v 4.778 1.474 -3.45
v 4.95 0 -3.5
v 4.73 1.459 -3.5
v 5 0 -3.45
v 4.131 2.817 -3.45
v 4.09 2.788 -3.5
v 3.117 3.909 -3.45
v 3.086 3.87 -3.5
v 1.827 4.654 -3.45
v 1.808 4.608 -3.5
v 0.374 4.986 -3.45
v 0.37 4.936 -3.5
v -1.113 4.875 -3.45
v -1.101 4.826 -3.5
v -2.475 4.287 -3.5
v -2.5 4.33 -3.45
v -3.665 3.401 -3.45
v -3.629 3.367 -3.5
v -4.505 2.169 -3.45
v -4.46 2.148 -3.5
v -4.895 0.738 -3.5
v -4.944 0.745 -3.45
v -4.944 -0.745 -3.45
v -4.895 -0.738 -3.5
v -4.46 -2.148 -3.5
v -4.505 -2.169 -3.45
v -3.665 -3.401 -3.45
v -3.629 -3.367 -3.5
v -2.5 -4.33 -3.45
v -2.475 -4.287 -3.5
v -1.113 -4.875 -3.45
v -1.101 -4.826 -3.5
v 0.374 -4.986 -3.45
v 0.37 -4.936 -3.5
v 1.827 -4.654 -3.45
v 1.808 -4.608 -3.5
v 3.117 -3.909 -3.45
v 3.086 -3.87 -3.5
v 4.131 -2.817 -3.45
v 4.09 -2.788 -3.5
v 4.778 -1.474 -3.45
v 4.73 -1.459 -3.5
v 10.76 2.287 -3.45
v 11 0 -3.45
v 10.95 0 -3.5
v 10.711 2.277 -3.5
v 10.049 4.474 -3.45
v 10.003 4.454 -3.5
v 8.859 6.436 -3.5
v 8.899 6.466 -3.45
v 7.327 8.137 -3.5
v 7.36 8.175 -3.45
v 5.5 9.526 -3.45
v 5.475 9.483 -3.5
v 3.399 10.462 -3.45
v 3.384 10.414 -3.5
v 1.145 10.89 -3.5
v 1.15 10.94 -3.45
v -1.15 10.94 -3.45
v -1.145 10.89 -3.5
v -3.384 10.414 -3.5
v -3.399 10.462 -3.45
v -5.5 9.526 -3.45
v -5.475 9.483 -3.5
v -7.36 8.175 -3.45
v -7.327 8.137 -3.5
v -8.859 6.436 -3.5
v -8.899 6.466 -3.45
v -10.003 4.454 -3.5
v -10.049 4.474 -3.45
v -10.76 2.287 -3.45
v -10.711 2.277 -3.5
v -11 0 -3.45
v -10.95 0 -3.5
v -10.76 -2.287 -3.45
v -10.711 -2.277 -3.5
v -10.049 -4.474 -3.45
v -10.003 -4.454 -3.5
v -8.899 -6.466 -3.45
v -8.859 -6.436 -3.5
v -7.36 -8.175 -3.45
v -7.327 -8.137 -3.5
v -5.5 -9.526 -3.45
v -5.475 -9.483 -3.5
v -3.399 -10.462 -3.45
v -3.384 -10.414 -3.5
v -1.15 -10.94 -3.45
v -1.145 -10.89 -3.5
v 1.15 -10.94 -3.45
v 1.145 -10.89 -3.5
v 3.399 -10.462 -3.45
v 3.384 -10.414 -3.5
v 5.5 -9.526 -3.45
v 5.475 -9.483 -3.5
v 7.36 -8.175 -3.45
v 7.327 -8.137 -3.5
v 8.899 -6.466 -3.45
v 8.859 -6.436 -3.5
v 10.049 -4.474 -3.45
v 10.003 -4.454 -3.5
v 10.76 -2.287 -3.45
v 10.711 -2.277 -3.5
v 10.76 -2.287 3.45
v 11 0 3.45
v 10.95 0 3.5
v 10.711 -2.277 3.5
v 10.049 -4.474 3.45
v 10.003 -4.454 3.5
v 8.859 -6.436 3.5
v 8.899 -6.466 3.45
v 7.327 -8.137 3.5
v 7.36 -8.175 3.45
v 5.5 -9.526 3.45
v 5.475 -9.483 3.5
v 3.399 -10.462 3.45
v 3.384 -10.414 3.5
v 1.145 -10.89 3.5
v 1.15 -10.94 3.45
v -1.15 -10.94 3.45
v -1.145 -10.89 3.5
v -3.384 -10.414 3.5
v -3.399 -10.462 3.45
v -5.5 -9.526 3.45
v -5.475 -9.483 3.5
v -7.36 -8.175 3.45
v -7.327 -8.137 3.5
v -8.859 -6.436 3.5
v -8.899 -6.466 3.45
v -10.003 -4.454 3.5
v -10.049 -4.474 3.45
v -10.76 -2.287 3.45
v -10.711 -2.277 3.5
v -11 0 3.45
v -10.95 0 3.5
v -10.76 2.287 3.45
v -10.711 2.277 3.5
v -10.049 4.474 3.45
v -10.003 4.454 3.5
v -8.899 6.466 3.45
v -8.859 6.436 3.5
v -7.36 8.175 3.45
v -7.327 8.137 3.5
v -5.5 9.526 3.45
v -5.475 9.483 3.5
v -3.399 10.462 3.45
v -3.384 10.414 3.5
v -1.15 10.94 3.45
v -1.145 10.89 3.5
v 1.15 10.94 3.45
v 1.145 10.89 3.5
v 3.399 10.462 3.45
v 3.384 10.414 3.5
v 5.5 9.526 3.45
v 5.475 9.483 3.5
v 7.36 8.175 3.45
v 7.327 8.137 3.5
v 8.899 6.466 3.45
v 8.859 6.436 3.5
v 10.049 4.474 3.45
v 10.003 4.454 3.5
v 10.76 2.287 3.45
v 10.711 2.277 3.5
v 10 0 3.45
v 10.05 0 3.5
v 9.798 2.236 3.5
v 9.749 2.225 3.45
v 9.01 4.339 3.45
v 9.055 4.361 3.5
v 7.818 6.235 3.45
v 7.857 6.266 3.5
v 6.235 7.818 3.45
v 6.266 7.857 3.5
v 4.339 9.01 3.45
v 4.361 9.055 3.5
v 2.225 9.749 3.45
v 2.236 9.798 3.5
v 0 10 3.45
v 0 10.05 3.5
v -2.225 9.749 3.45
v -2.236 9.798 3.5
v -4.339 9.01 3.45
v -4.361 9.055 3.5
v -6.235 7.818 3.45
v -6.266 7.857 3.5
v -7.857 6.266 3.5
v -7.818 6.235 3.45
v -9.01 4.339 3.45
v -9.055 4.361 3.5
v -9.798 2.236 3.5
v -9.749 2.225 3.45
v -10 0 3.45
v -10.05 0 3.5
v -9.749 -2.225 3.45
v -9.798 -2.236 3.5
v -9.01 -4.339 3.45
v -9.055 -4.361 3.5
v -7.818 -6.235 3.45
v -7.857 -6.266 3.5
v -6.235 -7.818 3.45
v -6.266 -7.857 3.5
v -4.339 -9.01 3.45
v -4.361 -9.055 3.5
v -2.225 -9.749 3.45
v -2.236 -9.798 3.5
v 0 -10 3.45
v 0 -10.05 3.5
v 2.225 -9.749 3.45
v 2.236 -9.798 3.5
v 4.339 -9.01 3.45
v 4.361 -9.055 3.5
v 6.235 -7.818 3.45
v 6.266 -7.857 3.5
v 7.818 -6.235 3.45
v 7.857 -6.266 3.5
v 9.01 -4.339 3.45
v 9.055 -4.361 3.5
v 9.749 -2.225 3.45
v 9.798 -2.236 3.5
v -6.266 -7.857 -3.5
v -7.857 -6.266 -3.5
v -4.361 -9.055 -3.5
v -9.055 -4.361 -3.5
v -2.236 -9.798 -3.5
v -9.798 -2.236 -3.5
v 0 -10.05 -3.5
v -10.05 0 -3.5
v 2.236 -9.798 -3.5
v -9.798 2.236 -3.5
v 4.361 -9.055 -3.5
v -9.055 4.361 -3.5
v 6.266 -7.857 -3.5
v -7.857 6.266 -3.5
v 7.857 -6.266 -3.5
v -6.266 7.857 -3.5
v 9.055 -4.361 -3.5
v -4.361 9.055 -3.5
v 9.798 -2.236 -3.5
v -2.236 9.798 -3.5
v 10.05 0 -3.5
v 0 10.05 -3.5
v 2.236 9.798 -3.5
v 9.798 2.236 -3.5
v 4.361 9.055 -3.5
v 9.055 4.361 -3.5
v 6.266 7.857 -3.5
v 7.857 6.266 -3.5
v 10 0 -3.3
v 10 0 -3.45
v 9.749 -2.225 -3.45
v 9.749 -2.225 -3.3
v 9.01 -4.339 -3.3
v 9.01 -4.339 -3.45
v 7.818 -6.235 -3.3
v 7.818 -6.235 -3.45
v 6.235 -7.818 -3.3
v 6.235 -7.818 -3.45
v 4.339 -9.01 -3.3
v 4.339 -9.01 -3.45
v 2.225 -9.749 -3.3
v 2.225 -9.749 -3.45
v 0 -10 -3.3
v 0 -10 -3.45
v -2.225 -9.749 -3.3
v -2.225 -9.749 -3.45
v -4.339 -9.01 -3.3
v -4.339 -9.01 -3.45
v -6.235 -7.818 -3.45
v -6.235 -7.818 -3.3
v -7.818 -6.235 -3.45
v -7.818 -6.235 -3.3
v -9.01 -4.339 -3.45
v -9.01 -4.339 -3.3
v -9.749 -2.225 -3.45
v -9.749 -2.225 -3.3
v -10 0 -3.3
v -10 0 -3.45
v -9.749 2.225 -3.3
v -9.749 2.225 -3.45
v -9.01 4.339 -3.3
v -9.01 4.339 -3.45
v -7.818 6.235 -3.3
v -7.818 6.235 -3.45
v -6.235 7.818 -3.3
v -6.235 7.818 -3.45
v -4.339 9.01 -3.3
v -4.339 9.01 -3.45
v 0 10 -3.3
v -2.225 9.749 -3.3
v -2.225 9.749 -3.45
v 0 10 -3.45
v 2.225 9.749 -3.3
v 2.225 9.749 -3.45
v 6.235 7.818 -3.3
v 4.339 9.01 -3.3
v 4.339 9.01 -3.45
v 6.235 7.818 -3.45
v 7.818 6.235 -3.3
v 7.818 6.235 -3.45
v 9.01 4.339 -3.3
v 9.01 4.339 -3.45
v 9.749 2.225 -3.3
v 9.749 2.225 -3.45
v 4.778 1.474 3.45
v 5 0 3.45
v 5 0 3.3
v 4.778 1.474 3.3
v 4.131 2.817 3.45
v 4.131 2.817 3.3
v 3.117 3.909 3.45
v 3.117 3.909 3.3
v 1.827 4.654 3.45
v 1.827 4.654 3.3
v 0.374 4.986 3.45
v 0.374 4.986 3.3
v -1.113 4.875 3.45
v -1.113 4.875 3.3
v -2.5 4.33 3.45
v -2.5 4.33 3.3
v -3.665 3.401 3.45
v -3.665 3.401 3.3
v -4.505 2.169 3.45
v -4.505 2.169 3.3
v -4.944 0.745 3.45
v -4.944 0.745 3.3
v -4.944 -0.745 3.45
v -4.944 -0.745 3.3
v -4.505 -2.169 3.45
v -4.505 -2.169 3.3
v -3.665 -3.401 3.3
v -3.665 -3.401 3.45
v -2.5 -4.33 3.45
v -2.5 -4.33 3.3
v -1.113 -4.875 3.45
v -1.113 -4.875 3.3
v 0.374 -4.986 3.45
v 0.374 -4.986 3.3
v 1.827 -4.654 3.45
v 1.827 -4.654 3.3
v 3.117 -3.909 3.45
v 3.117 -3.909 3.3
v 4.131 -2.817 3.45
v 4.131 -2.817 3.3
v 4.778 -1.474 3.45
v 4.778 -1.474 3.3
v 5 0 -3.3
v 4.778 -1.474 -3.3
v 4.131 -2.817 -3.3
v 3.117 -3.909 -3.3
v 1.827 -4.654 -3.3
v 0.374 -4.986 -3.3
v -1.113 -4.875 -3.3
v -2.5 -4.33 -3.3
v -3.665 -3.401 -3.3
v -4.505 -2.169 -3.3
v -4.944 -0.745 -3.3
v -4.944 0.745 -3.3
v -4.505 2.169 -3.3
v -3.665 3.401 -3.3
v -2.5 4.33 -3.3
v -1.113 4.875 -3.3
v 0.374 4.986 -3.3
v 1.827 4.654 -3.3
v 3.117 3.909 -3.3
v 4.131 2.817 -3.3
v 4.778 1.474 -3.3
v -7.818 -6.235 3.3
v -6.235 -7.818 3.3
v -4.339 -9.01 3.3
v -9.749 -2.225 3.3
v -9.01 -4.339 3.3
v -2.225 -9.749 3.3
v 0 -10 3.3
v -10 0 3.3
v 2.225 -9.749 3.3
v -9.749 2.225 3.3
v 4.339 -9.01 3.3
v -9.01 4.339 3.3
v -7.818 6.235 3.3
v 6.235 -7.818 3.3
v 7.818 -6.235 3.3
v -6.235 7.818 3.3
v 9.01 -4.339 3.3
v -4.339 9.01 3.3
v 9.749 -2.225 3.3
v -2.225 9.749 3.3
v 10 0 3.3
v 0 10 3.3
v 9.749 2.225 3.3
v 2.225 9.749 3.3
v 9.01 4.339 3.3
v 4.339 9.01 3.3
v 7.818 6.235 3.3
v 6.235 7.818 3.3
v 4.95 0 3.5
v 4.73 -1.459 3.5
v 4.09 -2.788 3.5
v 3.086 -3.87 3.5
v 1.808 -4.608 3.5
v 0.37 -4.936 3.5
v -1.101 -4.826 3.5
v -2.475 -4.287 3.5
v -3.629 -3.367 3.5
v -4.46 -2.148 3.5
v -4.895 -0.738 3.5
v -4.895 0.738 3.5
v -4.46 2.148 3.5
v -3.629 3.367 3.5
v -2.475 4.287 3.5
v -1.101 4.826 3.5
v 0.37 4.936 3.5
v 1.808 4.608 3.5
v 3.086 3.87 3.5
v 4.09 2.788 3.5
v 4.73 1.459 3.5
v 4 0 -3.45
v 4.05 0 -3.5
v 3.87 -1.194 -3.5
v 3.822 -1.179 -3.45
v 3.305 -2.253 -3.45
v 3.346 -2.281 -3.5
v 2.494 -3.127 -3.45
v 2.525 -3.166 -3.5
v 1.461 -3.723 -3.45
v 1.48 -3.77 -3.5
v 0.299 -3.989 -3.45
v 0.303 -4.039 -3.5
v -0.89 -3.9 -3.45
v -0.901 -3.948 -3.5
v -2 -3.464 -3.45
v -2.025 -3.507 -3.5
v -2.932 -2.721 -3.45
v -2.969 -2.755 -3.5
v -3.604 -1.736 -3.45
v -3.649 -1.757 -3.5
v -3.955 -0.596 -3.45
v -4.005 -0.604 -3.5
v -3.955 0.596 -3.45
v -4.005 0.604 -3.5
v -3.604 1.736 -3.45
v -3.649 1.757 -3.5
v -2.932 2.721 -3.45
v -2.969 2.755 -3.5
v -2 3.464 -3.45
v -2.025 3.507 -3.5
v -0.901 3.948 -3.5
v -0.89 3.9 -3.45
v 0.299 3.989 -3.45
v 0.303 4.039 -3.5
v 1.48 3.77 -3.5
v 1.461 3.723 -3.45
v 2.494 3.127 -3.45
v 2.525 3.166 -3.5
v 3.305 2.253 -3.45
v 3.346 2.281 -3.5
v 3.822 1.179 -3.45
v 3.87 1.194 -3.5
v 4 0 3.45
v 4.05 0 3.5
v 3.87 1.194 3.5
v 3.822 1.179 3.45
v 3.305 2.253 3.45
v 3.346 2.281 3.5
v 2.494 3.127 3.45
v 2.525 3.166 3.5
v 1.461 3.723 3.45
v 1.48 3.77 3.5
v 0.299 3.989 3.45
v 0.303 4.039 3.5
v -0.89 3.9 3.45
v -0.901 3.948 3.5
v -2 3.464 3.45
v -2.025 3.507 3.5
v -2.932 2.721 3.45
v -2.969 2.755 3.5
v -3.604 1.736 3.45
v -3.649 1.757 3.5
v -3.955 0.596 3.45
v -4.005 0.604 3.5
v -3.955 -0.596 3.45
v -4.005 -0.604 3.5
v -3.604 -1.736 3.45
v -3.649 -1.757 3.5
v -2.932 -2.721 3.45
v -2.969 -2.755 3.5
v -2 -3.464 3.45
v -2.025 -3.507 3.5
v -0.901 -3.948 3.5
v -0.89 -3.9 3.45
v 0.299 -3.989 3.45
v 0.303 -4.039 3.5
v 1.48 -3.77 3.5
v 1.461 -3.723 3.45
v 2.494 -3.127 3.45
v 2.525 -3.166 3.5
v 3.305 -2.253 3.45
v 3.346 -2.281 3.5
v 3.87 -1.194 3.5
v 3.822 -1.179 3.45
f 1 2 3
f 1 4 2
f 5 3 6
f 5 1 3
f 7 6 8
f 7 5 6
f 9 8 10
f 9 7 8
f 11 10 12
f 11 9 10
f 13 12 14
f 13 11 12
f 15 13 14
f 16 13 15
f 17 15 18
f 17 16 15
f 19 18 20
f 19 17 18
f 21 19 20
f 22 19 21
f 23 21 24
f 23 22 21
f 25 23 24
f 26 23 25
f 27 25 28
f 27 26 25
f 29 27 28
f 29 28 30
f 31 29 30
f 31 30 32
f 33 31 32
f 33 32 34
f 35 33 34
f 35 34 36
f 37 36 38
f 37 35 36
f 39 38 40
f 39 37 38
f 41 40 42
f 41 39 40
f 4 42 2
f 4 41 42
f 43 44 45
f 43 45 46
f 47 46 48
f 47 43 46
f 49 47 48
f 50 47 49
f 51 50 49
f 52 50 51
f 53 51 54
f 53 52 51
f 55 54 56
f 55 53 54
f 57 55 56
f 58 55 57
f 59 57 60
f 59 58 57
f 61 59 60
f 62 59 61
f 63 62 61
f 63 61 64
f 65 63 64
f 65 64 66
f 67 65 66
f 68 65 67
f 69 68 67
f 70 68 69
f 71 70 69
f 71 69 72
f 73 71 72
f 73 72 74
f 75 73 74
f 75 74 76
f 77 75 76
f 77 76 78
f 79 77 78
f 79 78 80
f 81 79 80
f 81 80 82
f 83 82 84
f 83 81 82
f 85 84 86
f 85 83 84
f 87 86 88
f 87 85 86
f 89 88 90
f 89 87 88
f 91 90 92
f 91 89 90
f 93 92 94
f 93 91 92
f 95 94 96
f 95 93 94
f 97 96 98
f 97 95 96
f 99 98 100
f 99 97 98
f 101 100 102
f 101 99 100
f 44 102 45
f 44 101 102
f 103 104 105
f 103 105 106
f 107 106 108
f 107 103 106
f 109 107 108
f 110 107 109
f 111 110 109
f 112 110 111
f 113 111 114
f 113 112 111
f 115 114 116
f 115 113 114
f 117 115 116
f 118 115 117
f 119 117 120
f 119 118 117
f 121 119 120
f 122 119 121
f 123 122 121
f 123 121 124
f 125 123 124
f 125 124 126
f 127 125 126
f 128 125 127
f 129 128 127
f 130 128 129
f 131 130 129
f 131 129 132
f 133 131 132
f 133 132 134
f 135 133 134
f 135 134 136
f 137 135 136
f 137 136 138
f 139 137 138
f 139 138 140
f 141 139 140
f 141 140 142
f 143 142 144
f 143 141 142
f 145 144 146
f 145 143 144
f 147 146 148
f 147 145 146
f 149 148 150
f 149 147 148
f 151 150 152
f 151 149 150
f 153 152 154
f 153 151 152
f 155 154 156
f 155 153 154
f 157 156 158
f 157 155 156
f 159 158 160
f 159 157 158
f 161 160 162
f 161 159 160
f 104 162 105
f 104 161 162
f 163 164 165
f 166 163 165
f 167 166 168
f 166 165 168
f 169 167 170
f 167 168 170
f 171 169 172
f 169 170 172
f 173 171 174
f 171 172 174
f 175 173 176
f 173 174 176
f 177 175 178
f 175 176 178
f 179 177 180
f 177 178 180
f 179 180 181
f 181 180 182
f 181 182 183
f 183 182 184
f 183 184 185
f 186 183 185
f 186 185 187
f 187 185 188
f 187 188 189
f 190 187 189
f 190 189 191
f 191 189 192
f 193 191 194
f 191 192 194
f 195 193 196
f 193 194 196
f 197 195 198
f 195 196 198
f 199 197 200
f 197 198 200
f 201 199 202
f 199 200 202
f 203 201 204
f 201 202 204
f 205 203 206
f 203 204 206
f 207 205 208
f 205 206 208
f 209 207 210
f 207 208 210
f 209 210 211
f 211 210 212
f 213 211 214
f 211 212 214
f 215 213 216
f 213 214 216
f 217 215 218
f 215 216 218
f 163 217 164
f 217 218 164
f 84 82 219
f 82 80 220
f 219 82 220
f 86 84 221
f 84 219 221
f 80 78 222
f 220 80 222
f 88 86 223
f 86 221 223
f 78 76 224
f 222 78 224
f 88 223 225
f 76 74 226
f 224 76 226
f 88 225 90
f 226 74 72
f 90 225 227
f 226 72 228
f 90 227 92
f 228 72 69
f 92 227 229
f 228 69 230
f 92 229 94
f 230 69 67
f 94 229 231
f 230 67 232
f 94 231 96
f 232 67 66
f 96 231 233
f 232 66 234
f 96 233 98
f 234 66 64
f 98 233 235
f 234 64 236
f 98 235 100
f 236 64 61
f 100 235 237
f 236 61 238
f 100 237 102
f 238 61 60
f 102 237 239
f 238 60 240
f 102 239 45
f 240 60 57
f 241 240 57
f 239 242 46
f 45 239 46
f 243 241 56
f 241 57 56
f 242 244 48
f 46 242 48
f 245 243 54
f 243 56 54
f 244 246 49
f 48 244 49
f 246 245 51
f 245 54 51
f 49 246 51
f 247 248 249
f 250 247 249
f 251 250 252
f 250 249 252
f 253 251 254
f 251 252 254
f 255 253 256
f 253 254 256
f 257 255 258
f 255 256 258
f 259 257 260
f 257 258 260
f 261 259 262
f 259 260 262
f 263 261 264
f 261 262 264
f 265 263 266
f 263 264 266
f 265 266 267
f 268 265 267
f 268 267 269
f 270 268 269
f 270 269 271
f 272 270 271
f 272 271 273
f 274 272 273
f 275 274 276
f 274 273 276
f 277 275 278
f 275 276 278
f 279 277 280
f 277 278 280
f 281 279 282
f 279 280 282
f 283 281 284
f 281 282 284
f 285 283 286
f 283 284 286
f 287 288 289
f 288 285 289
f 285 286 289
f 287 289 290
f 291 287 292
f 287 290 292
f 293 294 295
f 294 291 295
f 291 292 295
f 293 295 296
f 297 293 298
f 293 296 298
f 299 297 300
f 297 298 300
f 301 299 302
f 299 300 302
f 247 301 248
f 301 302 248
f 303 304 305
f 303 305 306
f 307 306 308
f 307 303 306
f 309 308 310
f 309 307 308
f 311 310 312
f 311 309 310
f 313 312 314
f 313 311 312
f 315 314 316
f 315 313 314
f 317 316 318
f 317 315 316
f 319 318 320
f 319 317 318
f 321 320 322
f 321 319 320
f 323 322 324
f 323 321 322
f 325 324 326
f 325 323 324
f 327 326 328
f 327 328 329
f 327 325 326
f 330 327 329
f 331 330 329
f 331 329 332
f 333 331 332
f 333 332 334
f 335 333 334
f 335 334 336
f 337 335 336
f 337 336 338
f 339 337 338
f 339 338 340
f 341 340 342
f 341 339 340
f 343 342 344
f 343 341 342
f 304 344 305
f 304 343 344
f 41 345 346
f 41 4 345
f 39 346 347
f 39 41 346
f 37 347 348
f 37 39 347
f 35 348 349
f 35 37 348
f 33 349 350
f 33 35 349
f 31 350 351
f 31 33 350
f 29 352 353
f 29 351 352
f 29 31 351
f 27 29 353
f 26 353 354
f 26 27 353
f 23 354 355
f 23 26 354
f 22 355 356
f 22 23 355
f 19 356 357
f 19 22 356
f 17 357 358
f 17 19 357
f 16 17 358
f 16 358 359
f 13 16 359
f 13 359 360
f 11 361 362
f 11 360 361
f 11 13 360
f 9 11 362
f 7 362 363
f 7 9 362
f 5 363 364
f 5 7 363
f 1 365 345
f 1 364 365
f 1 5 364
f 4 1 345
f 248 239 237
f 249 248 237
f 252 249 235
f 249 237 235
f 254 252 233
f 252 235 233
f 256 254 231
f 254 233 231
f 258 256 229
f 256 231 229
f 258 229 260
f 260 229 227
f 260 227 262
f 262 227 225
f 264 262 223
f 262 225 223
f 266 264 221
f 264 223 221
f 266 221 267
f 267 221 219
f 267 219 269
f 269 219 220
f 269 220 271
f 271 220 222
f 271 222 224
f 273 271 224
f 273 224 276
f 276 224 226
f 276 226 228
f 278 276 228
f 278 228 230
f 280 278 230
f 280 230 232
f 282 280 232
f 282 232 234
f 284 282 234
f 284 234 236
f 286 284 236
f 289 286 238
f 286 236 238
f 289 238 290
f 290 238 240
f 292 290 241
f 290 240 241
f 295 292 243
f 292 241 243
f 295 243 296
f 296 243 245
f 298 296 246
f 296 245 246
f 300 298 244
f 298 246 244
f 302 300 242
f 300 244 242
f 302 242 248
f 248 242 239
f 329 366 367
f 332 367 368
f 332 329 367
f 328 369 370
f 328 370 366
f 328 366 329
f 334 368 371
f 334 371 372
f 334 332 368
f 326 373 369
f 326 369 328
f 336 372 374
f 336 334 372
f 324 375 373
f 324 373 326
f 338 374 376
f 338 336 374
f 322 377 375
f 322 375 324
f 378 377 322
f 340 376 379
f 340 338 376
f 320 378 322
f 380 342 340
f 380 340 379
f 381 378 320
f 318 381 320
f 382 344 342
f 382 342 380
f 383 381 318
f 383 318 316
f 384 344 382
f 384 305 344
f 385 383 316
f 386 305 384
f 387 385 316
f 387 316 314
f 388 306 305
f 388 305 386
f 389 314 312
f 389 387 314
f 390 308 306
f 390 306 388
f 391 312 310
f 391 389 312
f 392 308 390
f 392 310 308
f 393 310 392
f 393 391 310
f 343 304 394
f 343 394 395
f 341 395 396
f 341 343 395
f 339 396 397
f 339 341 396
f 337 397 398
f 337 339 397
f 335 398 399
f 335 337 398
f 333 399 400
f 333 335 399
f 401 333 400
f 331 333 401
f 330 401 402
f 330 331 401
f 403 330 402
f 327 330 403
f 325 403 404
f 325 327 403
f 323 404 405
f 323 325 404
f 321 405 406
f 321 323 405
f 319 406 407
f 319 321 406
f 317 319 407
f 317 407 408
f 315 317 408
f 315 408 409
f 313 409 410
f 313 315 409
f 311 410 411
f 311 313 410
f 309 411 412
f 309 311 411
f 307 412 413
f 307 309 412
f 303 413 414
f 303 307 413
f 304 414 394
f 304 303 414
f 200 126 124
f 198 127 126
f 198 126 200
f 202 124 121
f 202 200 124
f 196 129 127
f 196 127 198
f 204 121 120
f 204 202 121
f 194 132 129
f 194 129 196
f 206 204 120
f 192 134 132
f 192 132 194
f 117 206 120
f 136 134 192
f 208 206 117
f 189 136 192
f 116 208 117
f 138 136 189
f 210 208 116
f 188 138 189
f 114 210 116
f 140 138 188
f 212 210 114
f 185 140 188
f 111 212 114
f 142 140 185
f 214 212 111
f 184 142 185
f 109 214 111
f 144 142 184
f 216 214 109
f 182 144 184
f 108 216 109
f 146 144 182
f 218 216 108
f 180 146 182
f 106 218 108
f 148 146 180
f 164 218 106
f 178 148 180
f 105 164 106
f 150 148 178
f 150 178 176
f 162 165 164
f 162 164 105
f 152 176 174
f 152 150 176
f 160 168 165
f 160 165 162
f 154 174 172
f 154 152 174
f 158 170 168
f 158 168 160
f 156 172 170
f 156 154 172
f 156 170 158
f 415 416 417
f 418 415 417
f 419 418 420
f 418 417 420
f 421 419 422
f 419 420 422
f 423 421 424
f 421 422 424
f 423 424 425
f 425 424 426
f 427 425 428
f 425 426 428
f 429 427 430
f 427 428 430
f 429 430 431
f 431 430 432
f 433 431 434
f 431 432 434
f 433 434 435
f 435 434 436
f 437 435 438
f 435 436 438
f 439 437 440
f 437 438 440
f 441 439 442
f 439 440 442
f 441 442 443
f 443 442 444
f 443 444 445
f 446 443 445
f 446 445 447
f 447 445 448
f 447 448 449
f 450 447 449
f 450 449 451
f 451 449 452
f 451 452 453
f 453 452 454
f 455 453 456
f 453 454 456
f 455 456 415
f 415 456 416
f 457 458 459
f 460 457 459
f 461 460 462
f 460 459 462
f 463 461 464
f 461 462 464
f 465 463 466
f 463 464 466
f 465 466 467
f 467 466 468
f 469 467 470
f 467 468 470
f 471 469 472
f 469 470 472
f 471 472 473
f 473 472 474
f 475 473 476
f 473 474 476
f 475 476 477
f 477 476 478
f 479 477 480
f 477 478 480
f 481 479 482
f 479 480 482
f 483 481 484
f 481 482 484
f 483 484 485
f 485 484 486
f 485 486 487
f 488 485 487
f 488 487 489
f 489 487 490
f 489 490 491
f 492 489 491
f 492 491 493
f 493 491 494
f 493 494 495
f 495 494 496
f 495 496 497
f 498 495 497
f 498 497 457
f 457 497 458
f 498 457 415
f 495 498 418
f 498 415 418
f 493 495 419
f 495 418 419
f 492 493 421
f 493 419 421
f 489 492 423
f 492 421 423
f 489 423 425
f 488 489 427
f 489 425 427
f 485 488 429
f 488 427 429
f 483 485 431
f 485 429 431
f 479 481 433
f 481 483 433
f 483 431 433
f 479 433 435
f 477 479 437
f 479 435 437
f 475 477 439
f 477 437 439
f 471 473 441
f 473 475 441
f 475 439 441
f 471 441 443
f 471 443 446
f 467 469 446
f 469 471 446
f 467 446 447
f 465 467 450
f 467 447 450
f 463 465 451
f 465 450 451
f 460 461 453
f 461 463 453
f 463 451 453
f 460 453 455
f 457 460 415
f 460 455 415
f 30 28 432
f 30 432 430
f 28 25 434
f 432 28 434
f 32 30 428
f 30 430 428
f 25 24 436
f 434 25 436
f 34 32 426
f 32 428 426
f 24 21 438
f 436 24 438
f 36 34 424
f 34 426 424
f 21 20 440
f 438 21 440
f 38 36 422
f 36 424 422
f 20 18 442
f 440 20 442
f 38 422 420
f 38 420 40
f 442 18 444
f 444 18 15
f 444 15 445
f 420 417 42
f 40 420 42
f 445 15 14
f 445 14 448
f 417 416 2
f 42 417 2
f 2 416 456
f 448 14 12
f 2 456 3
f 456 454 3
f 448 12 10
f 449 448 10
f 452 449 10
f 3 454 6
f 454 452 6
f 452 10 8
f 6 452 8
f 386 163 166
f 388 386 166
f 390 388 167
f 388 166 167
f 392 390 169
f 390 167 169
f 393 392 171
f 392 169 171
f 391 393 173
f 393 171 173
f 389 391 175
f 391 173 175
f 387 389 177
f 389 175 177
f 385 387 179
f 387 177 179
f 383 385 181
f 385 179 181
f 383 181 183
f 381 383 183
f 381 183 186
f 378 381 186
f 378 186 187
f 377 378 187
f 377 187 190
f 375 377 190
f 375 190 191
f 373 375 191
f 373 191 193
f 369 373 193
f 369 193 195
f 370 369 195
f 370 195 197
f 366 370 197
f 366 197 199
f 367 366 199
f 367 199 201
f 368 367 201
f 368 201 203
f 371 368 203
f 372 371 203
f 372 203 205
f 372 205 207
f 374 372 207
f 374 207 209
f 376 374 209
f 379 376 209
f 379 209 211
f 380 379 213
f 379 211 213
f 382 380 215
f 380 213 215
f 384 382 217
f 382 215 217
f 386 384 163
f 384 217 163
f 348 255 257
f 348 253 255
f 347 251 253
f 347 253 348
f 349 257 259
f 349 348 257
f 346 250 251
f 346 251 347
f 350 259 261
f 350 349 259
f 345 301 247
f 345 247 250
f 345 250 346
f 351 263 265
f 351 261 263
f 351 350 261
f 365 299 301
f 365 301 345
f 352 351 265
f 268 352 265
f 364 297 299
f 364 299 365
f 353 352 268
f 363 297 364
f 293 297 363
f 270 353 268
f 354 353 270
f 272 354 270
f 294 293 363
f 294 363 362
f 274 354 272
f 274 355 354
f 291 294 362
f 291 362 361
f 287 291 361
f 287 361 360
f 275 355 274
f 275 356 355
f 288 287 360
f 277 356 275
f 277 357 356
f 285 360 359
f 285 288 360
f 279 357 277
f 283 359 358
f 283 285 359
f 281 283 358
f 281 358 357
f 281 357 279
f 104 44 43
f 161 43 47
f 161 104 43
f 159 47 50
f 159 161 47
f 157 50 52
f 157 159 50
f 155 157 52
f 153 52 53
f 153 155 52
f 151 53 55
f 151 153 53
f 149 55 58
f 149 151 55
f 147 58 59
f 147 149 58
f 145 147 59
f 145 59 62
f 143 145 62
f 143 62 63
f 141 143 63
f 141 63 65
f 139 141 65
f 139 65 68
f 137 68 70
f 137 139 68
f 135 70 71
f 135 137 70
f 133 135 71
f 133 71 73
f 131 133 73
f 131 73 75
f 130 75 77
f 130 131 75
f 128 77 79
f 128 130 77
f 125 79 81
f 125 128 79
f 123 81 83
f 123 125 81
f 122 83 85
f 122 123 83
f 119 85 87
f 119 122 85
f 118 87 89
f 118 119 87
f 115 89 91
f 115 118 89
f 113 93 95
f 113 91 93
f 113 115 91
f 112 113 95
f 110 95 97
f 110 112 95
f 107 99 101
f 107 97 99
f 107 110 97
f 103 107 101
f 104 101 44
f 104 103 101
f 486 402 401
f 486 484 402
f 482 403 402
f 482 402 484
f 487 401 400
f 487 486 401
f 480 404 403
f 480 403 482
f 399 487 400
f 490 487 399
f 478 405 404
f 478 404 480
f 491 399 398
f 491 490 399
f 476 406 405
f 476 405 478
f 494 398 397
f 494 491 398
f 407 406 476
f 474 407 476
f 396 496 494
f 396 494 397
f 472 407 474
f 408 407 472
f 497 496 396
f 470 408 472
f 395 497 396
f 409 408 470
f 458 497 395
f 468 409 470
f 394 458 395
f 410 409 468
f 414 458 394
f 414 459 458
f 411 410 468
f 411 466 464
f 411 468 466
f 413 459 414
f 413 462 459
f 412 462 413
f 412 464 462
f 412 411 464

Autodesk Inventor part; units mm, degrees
ref_plane "YZ Plane" through (0, 0, 0) normal (1, 0, 0) x (0, 1, 0)
ref_plane "XZ Plane" through (0, 0, 0) normal (0, 1, 0) x (-1, 0, 0)
ref_plane "XY Plane" through (0, 0, 0) normal (0, 0, 1) x (1, 0, 0)
sketch "Skizze1" plane through (0, 0, 0) normal (0, 0, 1) x (1, 0, 0)
  line L0 (-15.4, 0) -> (15.4, 0) projected
  line L1 (0, -15.4) -> (0, 15.4) projected
  circle A0 centre (0, 0) radius 11
  circle A1 centre (0, 0) radius 4
  dimension "d0" = 22
  dimension "d1" = 8
extrude "Extrusion1" add sketch "Skizze1" along normal mid plane 7 contours A1 L1 A0 L0 | L0 A0 L1 A1 | A1 L0 A0 L1 | L1 A0 L0 A1
sketch "Skizze2" plane through (0, 0, 3.5) normal (0, 0, 1) x (1, 0, 0)
  circle A0 centre (0, 0) radius 4 projected
  circle A1 centre (0, 0) radius 11 projected
  circle A2 centre (0, 0) radius 5
  circle A3 centre (0, 0) radius 10
  dimension "d4" = 10
  dimension "d5" = 20
extrude "Extrusion2" cut sketch "Skizze2" against normal blind 0.2 contours A3
mirror "Spiegeln1" about plane through (0, 0, 0) normal (0, 0, 1) of "Extrusion2"
chamfer "Fase1" distance 0.05 angle 45 1 edges at (-10, 0, 3.5)
chamfer "Fase2" distance 0.05 angle 45 1 edges at (-5, 0, 3.5)
chamfer "Fase3" distance 0.05 angle 45 1 edges at (-4, 0, 3.5)
chamfer "Fase4" distance 0.05 angle 45 1 edges at (-11, 0, 3.5)
chamfer "Fase5" distance 0.05 angle 45 1 edges at (-11, 0, -3.5)
chamfer "Fase6" distance 0.05 angle 45 1 edges at (-10, 0, -3.5)
chamfer "Fase7" distance 0.05 angle 45 1 edges at (-5, 0, -3.5)
chamfer "Fase8" distance 0.05 angle 45 1 edges at (-4, 0, -3.5)
properties part number "Kugellager_8x22x7_608ZZ" material "Stahl, Kohlenstoff"
